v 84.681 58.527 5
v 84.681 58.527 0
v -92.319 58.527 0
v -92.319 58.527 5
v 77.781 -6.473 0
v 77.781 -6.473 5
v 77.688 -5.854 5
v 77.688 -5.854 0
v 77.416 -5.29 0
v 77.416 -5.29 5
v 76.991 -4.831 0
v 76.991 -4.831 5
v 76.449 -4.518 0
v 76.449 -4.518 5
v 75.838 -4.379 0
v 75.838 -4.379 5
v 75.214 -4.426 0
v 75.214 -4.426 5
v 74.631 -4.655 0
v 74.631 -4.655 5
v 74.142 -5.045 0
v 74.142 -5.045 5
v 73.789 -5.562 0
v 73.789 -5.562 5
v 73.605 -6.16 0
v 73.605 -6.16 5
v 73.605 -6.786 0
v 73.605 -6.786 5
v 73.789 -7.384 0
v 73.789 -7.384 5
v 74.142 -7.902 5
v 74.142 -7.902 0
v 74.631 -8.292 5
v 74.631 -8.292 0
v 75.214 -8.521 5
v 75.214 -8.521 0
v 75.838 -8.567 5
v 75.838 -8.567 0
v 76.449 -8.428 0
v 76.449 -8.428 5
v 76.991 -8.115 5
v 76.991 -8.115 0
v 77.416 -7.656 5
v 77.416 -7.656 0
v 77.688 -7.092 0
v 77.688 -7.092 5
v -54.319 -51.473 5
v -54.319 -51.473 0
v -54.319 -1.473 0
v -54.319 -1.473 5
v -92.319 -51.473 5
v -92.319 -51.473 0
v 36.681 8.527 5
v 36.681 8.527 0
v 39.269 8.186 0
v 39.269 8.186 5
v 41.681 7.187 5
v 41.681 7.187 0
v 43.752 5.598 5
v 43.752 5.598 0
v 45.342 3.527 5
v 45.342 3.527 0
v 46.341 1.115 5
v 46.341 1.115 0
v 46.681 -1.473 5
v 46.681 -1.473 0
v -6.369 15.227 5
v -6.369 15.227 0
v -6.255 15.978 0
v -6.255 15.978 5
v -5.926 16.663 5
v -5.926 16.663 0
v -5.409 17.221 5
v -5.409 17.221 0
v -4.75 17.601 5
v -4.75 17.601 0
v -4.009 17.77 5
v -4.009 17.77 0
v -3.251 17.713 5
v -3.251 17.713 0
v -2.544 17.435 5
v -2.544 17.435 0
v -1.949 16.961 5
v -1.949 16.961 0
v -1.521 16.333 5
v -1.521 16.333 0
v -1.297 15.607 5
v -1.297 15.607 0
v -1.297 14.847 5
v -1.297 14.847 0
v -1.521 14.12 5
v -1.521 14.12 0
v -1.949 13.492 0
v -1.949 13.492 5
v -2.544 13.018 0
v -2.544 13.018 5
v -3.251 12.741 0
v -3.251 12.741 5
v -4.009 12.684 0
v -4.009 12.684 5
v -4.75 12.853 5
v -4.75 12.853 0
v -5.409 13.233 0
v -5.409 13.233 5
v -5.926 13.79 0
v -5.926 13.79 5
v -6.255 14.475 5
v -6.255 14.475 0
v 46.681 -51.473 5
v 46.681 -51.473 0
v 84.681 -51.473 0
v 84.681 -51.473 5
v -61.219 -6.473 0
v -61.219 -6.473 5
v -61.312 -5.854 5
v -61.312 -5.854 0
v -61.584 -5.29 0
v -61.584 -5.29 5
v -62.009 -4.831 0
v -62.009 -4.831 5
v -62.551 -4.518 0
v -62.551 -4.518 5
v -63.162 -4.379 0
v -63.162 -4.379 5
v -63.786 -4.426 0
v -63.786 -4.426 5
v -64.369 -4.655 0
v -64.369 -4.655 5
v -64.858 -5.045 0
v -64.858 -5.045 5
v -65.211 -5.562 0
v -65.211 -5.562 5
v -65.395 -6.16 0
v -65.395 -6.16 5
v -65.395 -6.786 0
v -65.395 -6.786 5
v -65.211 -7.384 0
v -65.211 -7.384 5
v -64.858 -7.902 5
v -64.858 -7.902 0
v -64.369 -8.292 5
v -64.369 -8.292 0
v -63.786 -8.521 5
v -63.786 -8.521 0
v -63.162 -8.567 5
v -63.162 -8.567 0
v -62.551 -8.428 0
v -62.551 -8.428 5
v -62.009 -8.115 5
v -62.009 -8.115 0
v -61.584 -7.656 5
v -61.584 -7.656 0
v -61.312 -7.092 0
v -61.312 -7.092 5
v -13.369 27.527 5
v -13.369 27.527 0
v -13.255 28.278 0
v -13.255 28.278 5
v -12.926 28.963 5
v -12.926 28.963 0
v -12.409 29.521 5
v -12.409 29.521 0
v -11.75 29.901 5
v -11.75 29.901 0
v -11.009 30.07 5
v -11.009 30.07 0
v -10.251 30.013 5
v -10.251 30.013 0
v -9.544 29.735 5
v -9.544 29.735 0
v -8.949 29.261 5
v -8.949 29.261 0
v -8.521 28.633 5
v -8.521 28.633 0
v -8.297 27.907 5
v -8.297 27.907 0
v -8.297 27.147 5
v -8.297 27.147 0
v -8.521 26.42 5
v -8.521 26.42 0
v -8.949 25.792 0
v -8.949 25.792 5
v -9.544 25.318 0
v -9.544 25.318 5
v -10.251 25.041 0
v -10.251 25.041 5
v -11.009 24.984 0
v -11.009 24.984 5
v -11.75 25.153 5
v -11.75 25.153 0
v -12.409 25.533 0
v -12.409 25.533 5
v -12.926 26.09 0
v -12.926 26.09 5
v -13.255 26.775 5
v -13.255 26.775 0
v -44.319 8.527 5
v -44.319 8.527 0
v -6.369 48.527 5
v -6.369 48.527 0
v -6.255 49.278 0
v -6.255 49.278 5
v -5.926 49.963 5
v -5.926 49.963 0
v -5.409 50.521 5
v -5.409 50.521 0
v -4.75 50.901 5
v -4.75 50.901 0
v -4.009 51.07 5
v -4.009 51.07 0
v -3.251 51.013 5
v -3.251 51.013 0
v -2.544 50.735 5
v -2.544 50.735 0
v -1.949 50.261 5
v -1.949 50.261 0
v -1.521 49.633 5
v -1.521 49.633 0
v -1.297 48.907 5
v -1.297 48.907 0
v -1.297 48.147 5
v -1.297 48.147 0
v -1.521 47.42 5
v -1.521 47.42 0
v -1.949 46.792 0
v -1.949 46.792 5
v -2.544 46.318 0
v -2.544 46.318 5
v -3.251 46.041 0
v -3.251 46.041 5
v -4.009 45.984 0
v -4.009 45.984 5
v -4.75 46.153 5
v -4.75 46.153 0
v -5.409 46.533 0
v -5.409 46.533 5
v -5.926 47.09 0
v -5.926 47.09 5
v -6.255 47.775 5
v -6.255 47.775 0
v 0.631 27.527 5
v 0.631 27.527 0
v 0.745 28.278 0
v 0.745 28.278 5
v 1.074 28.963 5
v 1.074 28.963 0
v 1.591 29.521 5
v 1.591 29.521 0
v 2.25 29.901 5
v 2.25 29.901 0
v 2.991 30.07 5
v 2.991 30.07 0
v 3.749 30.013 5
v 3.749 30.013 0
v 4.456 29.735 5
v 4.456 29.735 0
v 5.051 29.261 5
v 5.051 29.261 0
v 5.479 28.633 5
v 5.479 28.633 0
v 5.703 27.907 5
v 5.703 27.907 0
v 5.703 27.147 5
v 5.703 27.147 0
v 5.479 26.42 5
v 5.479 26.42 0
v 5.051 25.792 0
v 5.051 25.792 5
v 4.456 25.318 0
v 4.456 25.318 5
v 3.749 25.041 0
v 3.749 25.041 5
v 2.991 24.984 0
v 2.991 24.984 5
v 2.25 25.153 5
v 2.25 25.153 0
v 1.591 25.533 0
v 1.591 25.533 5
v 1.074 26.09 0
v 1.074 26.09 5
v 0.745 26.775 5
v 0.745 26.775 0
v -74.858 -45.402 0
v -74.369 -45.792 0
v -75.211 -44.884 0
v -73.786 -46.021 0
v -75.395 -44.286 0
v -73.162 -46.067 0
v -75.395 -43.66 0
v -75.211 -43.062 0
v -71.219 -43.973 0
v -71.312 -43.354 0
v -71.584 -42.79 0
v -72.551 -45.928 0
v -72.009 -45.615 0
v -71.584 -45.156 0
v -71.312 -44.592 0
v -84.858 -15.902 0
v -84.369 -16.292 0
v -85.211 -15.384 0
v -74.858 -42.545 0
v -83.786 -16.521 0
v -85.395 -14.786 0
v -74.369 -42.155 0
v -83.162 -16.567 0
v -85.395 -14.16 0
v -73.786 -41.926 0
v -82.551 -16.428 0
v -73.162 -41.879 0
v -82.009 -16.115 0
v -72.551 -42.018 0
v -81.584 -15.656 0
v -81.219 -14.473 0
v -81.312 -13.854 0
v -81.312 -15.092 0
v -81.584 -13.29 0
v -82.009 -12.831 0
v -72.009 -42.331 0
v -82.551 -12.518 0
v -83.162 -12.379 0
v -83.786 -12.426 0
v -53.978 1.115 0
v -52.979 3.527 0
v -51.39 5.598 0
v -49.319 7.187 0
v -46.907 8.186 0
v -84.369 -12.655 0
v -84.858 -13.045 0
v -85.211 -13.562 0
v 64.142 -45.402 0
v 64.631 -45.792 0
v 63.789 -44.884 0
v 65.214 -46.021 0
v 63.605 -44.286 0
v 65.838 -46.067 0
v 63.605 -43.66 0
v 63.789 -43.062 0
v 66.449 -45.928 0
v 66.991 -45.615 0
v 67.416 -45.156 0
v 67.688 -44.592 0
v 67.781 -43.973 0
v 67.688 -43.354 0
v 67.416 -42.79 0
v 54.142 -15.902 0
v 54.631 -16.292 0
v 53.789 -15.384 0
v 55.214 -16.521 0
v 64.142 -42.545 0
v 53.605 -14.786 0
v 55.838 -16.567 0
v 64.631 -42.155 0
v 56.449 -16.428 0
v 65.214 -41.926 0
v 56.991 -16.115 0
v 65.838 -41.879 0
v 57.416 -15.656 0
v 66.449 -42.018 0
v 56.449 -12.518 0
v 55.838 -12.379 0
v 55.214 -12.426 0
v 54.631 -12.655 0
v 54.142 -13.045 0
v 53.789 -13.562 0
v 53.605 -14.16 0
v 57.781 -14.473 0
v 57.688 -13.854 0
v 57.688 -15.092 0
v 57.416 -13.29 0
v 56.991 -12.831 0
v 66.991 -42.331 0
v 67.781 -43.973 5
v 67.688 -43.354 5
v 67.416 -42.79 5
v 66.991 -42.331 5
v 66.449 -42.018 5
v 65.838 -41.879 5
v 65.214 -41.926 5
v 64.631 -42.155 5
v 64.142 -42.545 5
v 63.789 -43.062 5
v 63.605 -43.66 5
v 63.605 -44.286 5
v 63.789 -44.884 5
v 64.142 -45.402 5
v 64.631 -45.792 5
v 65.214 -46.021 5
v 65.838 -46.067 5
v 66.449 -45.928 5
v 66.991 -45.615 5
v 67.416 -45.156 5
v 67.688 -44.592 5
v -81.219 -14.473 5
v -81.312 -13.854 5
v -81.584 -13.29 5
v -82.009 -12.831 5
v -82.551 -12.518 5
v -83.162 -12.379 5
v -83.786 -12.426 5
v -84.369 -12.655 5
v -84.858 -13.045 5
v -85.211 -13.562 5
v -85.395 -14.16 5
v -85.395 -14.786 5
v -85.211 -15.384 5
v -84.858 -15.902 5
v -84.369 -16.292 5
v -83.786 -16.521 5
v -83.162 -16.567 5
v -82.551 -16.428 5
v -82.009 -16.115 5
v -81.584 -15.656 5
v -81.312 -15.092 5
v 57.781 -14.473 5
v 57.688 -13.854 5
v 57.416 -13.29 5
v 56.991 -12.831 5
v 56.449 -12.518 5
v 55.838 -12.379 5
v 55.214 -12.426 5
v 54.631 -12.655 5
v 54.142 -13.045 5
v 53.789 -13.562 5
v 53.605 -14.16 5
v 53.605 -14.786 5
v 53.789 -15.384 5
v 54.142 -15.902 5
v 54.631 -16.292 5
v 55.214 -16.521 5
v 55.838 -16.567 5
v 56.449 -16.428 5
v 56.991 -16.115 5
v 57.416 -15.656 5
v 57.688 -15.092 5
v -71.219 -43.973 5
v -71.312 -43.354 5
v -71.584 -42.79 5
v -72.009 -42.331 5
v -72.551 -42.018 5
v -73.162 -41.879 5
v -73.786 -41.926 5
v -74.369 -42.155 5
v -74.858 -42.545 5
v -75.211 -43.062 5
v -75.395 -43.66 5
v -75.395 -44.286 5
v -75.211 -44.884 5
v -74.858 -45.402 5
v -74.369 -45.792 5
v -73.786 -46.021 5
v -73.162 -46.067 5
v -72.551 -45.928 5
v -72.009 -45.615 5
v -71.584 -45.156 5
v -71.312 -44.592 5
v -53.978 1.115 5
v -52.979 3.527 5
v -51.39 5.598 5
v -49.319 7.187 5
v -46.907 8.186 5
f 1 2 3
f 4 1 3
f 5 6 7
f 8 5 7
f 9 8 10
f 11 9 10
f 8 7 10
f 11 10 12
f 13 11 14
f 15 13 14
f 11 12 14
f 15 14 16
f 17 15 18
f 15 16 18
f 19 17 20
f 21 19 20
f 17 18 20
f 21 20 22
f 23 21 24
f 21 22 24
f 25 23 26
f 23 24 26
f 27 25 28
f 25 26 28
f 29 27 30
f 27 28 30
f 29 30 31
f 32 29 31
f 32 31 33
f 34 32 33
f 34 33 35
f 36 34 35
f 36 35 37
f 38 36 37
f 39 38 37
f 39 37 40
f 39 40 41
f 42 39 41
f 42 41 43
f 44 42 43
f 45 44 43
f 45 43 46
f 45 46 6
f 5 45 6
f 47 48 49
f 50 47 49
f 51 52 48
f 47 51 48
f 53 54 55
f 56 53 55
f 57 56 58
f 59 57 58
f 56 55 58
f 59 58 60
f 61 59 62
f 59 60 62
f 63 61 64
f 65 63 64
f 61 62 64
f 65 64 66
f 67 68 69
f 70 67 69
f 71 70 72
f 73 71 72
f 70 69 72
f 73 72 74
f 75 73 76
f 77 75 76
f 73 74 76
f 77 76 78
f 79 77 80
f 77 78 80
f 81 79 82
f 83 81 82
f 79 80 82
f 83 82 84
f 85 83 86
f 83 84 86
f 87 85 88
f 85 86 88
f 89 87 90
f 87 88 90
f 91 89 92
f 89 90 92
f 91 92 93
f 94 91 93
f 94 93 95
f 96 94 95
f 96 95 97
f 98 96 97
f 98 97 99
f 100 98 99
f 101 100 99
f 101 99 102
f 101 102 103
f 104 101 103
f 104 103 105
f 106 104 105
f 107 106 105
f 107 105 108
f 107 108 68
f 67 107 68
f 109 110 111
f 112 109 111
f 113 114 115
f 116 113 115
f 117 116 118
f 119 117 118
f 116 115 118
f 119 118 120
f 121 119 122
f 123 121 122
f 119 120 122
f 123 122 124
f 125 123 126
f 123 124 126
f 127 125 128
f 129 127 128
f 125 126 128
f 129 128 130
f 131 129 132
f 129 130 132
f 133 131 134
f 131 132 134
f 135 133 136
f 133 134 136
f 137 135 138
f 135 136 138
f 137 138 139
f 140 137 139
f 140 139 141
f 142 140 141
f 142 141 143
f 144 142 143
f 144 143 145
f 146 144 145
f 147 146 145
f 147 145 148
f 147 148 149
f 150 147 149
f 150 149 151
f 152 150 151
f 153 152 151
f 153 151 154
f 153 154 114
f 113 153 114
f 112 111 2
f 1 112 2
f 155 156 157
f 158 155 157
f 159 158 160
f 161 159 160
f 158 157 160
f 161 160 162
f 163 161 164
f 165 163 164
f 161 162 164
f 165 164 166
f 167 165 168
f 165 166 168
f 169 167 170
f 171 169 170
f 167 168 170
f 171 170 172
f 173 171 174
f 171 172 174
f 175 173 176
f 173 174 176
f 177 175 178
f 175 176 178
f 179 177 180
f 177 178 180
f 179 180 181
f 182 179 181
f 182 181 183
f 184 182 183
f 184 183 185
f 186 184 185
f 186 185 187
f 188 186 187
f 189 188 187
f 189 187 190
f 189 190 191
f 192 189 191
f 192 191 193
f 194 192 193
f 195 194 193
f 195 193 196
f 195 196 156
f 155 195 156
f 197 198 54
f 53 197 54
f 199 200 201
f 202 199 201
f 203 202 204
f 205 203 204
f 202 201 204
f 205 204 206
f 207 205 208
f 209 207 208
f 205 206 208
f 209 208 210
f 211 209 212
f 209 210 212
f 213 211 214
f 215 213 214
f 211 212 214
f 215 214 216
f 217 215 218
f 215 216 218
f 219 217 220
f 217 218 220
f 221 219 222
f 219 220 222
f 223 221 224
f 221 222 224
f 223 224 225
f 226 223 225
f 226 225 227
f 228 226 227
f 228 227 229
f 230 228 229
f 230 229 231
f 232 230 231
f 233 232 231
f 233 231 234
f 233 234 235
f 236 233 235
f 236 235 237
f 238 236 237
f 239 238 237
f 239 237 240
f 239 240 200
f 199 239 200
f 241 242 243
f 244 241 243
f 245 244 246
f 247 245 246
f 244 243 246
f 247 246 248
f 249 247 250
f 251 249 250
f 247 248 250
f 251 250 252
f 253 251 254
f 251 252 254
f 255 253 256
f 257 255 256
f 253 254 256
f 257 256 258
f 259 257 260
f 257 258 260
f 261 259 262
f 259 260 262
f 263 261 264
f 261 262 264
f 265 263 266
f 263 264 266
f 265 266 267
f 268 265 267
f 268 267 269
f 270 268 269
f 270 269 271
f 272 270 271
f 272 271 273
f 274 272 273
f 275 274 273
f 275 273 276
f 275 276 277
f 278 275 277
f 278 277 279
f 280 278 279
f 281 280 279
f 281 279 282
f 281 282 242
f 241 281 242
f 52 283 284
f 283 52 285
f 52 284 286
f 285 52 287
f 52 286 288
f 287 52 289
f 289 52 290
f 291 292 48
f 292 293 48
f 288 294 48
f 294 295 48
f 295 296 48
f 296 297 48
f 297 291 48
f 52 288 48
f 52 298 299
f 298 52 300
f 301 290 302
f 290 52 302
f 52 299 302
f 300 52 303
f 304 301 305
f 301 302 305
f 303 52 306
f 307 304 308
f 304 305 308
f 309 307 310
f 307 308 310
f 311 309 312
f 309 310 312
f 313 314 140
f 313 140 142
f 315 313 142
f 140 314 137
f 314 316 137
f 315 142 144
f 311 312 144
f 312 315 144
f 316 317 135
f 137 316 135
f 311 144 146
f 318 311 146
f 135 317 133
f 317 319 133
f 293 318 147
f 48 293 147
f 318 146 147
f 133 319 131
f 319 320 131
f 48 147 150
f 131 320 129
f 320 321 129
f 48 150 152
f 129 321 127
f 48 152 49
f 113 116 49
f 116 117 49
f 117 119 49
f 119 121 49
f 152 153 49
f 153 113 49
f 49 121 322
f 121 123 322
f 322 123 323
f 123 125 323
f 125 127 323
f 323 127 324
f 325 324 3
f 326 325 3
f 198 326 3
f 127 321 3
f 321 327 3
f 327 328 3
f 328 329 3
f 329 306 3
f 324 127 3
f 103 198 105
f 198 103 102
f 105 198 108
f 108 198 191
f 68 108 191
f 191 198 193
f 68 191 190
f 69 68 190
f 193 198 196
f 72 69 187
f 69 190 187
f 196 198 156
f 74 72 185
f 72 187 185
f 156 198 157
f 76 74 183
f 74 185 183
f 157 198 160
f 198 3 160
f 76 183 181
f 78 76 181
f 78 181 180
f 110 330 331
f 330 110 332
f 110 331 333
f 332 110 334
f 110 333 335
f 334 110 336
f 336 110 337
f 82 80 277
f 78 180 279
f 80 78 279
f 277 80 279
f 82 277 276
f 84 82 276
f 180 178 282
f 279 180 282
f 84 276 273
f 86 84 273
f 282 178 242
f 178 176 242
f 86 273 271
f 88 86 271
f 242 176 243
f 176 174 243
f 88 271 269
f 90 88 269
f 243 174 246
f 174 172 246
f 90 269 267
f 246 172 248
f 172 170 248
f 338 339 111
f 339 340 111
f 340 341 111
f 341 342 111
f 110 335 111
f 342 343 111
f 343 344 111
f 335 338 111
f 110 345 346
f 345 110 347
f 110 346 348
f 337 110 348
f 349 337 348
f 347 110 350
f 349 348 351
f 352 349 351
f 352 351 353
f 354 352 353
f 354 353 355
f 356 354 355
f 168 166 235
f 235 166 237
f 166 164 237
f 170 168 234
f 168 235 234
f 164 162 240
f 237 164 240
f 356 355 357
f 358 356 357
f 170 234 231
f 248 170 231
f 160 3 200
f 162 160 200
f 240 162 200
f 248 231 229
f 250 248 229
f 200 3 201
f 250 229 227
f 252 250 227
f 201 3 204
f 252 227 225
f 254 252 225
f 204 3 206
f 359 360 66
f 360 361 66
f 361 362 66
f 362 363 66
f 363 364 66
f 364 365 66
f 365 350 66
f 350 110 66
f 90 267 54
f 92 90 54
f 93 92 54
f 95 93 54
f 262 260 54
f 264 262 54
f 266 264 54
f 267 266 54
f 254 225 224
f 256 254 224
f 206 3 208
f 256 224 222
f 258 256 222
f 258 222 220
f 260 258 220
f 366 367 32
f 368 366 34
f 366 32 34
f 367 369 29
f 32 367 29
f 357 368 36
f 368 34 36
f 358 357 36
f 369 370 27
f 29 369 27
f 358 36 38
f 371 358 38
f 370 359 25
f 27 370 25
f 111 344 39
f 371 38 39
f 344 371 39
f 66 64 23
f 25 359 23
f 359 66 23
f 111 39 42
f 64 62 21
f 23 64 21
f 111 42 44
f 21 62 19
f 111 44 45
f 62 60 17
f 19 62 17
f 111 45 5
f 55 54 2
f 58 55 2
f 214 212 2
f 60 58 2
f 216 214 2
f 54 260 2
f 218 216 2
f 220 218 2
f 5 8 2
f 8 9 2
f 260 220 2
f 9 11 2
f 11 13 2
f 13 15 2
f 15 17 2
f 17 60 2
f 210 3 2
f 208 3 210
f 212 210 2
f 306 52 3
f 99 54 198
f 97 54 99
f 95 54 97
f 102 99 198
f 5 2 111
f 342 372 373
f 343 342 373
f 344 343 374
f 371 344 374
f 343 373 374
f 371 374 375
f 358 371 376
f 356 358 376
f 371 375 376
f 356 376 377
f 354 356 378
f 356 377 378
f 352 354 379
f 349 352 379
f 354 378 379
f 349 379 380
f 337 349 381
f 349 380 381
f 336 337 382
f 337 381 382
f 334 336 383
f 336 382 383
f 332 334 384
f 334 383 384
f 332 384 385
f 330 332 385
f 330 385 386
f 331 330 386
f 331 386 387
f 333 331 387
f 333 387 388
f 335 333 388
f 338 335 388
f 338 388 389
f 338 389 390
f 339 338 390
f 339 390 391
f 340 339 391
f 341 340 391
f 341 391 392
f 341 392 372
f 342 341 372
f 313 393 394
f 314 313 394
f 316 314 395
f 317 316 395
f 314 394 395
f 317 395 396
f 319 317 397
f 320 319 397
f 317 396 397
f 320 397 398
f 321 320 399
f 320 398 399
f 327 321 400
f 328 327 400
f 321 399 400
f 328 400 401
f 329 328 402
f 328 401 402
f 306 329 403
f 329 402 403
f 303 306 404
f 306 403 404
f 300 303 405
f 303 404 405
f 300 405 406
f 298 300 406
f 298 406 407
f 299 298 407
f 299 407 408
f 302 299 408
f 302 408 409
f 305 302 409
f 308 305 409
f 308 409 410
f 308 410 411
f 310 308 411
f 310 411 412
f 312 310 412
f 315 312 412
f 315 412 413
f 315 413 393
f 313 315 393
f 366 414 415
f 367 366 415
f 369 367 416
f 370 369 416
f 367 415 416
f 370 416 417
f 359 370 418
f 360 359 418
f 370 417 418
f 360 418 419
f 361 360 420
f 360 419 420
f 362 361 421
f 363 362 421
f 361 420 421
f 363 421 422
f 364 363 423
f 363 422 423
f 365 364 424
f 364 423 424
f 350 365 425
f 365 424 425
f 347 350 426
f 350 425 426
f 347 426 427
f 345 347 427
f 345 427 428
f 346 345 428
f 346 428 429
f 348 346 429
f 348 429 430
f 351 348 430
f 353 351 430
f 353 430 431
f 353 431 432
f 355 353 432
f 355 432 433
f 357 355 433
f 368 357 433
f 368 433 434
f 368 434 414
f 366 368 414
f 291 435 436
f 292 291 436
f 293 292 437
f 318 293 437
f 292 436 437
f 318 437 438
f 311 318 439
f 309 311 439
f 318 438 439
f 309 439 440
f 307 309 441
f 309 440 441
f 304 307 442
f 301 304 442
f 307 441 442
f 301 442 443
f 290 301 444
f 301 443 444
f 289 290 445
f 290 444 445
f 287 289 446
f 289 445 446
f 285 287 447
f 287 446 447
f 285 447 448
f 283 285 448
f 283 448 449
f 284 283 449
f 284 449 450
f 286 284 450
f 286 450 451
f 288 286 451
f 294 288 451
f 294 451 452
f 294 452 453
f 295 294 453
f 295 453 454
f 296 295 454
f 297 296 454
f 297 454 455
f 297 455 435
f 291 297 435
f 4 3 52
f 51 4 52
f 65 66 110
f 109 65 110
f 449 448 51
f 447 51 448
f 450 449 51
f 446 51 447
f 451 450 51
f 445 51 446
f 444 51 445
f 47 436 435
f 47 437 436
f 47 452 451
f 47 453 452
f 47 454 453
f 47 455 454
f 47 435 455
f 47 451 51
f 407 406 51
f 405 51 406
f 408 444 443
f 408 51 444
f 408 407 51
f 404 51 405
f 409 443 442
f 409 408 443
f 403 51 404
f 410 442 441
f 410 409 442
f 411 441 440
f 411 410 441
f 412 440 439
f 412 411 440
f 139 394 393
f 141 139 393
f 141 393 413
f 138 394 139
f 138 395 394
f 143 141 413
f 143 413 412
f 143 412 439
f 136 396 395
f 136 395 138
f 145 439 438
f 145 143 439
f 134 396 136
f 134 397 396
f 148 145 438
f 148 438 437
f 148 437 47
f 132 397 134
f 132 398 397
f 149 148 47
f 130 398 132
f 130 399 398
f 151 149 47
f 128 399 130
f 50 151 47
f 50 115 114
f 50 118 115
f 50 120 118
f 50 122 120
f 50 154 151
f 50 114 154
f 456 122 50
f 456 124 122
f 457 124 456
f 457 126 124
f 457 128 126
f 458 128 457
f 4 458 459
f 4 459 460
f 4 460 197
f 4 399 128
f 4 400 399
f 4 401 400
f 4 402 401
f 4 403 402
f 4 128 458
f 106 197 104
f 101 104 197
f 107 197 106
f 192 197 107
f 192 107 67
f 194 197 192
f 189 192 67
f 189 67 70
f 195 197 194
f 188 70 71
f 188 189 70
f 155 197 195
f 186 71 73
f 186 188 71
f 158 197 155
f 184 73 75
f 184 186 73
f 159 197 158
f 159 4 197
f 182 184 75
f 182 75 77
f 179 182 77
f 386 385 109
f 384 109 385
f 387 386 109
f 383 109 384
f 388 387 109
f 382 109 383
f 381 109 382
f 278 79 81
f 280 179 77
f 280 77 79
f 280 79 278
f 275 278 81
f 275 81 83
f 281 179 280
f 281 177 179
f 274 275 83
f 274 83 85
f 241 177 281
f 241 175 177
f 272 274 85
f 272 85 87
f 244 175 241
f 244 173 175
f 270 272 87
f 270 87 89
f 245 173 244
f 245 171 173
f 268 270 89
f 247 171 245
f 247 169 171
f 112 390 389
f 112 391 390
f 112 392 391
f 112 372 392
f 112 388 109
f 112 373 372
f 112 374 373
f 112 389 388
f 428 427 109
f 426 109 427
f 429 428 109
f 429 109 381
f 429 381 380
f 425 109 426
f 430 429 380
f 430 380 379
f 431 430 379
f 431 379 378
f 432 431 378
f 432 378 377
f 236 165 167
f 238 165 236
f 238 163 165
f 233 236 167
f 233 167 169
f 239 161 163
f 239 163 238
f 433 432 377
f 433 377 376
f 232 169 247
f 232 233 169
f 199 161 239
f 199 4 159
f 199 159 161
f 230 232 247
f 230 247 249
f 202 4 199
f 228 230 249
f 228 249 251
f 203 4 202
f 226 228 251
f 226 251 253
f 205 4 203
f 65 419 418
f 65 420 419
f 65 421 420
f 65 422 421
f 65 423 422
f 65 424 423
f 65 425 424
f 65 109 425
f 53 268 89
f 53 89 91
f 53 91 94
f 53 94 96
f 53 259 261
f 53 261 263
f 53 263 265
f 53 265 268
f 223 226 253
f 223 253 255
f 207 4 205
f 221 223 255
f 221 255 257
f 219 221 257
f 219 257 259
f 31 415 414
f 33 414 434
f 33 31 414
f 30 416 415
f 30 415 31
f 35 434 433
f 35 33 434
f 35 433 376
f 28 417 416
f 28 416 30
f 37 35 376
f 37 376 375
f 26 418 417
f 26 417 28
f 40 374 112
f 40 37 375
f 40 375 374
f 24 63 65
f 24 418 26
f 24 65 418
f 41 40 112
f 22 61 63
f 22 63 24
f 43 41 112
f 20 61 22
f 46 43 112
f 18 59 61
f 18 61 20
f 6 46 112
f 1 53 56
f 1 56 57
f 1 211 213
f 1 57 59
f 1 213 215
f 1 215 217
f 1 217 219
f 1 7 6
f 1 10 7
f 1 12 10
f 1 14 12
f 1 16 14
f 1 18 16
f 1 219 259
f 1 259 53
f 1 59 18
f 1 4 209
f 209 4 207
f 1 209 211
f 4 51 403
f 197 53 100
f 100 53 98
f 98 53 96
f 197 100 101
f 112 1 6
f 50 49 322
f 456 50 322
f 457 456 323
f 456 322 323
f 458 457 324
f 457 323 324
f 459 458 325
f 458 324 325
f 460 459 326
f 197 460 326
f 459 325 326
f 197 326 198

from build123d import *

# Parameters (mm, degrees)
F1_DEPTH = 5
F3_D     = 5.1
F4_R     = 2.1
F5_DEPTH = 25


with BuildPart() as f1:
    # F0 (on Top) → F1 (new body)
    with BuildSketch(Plane.XY):
        with BuildLine():
            Line((84.6812899327, 58.5268347502), (-92.3187100673, 58.5268347502))
            Line((-92.3187100673, 58.5268347502), (-92.3187100673, 8.5268347502))
            Line((-92.3187100673, 8.5268347502), (-92.3187100673, -51.4731652498))
            Line((-92.3187100673, -51.4731652498), (-54.3187100673, -51.4731652498))
            Line((-54.3187100673, -51.4731652498), (-54.3187100673, -1.4731652498))
            ThreePointArc((-54.3187100673, -1.4731652498), (-51.3897778791, 5.597902562), (-44.3187100673, 8.5268347502))
            Line((-44.3187100673, 8.5268347502), (36.6812899327, 8.5268347502))
            ThreePointArc((36.6812899327, 8.5268347502), (43.7523577446, 5.597902562), (46.6812899327, -1.4731652498))
            Line((46.6812899327, -1.4731652498), (46.6812899327, -51.4731652498))
            Line((46.6812899327, -51.4731652498), (84.6812899327, -51.4731652498))
            Line((84.6812899327, -51.4731652498), (84.6812899327, 8.5268347502))
            Line((84.6812899327, 8.5268347502), (84.6812899327, 58.5268347502))
        make_face()
    extrude(amount=F1_DEPTH)

    # F3 (through all)
    with Locations(Plane.XY.offset(5)):
        with Locations((-10.8187100673, 27.5268347502), (-3.8187100673, 48.5268347502), (3.1812899327, 27.5268347502), (-3.8187100673, 15.2268347502)):
            Hole(F3_D / 2)

    # F4 (on face) → F5 (cut)
    with BuildSketch(Plane.XY.offset(5)):
        with Locations((-63.3187100673, -6.4731652498)):
            Circle(F4_R)
        with Locations((55.6812899327, -14.4731652498)):
            Circle(F4_R)
        with Locations((-83.3187100673, -14.4731652498)):
            Circle(F4_R)
        with Locations((-73.3187100673, -43.9731652498)):
            Circle(F4_R)
        with Locations((75.6812899327, -6.4731652498)):
            Circle(F4_R)
        with Locations((65.6812899327, -43.9731652498)):
            Circle(F4_R)
    extrude(amount=-F5_DEPTH, mode=Mode.SUBTRACT)


solid = f1.part
